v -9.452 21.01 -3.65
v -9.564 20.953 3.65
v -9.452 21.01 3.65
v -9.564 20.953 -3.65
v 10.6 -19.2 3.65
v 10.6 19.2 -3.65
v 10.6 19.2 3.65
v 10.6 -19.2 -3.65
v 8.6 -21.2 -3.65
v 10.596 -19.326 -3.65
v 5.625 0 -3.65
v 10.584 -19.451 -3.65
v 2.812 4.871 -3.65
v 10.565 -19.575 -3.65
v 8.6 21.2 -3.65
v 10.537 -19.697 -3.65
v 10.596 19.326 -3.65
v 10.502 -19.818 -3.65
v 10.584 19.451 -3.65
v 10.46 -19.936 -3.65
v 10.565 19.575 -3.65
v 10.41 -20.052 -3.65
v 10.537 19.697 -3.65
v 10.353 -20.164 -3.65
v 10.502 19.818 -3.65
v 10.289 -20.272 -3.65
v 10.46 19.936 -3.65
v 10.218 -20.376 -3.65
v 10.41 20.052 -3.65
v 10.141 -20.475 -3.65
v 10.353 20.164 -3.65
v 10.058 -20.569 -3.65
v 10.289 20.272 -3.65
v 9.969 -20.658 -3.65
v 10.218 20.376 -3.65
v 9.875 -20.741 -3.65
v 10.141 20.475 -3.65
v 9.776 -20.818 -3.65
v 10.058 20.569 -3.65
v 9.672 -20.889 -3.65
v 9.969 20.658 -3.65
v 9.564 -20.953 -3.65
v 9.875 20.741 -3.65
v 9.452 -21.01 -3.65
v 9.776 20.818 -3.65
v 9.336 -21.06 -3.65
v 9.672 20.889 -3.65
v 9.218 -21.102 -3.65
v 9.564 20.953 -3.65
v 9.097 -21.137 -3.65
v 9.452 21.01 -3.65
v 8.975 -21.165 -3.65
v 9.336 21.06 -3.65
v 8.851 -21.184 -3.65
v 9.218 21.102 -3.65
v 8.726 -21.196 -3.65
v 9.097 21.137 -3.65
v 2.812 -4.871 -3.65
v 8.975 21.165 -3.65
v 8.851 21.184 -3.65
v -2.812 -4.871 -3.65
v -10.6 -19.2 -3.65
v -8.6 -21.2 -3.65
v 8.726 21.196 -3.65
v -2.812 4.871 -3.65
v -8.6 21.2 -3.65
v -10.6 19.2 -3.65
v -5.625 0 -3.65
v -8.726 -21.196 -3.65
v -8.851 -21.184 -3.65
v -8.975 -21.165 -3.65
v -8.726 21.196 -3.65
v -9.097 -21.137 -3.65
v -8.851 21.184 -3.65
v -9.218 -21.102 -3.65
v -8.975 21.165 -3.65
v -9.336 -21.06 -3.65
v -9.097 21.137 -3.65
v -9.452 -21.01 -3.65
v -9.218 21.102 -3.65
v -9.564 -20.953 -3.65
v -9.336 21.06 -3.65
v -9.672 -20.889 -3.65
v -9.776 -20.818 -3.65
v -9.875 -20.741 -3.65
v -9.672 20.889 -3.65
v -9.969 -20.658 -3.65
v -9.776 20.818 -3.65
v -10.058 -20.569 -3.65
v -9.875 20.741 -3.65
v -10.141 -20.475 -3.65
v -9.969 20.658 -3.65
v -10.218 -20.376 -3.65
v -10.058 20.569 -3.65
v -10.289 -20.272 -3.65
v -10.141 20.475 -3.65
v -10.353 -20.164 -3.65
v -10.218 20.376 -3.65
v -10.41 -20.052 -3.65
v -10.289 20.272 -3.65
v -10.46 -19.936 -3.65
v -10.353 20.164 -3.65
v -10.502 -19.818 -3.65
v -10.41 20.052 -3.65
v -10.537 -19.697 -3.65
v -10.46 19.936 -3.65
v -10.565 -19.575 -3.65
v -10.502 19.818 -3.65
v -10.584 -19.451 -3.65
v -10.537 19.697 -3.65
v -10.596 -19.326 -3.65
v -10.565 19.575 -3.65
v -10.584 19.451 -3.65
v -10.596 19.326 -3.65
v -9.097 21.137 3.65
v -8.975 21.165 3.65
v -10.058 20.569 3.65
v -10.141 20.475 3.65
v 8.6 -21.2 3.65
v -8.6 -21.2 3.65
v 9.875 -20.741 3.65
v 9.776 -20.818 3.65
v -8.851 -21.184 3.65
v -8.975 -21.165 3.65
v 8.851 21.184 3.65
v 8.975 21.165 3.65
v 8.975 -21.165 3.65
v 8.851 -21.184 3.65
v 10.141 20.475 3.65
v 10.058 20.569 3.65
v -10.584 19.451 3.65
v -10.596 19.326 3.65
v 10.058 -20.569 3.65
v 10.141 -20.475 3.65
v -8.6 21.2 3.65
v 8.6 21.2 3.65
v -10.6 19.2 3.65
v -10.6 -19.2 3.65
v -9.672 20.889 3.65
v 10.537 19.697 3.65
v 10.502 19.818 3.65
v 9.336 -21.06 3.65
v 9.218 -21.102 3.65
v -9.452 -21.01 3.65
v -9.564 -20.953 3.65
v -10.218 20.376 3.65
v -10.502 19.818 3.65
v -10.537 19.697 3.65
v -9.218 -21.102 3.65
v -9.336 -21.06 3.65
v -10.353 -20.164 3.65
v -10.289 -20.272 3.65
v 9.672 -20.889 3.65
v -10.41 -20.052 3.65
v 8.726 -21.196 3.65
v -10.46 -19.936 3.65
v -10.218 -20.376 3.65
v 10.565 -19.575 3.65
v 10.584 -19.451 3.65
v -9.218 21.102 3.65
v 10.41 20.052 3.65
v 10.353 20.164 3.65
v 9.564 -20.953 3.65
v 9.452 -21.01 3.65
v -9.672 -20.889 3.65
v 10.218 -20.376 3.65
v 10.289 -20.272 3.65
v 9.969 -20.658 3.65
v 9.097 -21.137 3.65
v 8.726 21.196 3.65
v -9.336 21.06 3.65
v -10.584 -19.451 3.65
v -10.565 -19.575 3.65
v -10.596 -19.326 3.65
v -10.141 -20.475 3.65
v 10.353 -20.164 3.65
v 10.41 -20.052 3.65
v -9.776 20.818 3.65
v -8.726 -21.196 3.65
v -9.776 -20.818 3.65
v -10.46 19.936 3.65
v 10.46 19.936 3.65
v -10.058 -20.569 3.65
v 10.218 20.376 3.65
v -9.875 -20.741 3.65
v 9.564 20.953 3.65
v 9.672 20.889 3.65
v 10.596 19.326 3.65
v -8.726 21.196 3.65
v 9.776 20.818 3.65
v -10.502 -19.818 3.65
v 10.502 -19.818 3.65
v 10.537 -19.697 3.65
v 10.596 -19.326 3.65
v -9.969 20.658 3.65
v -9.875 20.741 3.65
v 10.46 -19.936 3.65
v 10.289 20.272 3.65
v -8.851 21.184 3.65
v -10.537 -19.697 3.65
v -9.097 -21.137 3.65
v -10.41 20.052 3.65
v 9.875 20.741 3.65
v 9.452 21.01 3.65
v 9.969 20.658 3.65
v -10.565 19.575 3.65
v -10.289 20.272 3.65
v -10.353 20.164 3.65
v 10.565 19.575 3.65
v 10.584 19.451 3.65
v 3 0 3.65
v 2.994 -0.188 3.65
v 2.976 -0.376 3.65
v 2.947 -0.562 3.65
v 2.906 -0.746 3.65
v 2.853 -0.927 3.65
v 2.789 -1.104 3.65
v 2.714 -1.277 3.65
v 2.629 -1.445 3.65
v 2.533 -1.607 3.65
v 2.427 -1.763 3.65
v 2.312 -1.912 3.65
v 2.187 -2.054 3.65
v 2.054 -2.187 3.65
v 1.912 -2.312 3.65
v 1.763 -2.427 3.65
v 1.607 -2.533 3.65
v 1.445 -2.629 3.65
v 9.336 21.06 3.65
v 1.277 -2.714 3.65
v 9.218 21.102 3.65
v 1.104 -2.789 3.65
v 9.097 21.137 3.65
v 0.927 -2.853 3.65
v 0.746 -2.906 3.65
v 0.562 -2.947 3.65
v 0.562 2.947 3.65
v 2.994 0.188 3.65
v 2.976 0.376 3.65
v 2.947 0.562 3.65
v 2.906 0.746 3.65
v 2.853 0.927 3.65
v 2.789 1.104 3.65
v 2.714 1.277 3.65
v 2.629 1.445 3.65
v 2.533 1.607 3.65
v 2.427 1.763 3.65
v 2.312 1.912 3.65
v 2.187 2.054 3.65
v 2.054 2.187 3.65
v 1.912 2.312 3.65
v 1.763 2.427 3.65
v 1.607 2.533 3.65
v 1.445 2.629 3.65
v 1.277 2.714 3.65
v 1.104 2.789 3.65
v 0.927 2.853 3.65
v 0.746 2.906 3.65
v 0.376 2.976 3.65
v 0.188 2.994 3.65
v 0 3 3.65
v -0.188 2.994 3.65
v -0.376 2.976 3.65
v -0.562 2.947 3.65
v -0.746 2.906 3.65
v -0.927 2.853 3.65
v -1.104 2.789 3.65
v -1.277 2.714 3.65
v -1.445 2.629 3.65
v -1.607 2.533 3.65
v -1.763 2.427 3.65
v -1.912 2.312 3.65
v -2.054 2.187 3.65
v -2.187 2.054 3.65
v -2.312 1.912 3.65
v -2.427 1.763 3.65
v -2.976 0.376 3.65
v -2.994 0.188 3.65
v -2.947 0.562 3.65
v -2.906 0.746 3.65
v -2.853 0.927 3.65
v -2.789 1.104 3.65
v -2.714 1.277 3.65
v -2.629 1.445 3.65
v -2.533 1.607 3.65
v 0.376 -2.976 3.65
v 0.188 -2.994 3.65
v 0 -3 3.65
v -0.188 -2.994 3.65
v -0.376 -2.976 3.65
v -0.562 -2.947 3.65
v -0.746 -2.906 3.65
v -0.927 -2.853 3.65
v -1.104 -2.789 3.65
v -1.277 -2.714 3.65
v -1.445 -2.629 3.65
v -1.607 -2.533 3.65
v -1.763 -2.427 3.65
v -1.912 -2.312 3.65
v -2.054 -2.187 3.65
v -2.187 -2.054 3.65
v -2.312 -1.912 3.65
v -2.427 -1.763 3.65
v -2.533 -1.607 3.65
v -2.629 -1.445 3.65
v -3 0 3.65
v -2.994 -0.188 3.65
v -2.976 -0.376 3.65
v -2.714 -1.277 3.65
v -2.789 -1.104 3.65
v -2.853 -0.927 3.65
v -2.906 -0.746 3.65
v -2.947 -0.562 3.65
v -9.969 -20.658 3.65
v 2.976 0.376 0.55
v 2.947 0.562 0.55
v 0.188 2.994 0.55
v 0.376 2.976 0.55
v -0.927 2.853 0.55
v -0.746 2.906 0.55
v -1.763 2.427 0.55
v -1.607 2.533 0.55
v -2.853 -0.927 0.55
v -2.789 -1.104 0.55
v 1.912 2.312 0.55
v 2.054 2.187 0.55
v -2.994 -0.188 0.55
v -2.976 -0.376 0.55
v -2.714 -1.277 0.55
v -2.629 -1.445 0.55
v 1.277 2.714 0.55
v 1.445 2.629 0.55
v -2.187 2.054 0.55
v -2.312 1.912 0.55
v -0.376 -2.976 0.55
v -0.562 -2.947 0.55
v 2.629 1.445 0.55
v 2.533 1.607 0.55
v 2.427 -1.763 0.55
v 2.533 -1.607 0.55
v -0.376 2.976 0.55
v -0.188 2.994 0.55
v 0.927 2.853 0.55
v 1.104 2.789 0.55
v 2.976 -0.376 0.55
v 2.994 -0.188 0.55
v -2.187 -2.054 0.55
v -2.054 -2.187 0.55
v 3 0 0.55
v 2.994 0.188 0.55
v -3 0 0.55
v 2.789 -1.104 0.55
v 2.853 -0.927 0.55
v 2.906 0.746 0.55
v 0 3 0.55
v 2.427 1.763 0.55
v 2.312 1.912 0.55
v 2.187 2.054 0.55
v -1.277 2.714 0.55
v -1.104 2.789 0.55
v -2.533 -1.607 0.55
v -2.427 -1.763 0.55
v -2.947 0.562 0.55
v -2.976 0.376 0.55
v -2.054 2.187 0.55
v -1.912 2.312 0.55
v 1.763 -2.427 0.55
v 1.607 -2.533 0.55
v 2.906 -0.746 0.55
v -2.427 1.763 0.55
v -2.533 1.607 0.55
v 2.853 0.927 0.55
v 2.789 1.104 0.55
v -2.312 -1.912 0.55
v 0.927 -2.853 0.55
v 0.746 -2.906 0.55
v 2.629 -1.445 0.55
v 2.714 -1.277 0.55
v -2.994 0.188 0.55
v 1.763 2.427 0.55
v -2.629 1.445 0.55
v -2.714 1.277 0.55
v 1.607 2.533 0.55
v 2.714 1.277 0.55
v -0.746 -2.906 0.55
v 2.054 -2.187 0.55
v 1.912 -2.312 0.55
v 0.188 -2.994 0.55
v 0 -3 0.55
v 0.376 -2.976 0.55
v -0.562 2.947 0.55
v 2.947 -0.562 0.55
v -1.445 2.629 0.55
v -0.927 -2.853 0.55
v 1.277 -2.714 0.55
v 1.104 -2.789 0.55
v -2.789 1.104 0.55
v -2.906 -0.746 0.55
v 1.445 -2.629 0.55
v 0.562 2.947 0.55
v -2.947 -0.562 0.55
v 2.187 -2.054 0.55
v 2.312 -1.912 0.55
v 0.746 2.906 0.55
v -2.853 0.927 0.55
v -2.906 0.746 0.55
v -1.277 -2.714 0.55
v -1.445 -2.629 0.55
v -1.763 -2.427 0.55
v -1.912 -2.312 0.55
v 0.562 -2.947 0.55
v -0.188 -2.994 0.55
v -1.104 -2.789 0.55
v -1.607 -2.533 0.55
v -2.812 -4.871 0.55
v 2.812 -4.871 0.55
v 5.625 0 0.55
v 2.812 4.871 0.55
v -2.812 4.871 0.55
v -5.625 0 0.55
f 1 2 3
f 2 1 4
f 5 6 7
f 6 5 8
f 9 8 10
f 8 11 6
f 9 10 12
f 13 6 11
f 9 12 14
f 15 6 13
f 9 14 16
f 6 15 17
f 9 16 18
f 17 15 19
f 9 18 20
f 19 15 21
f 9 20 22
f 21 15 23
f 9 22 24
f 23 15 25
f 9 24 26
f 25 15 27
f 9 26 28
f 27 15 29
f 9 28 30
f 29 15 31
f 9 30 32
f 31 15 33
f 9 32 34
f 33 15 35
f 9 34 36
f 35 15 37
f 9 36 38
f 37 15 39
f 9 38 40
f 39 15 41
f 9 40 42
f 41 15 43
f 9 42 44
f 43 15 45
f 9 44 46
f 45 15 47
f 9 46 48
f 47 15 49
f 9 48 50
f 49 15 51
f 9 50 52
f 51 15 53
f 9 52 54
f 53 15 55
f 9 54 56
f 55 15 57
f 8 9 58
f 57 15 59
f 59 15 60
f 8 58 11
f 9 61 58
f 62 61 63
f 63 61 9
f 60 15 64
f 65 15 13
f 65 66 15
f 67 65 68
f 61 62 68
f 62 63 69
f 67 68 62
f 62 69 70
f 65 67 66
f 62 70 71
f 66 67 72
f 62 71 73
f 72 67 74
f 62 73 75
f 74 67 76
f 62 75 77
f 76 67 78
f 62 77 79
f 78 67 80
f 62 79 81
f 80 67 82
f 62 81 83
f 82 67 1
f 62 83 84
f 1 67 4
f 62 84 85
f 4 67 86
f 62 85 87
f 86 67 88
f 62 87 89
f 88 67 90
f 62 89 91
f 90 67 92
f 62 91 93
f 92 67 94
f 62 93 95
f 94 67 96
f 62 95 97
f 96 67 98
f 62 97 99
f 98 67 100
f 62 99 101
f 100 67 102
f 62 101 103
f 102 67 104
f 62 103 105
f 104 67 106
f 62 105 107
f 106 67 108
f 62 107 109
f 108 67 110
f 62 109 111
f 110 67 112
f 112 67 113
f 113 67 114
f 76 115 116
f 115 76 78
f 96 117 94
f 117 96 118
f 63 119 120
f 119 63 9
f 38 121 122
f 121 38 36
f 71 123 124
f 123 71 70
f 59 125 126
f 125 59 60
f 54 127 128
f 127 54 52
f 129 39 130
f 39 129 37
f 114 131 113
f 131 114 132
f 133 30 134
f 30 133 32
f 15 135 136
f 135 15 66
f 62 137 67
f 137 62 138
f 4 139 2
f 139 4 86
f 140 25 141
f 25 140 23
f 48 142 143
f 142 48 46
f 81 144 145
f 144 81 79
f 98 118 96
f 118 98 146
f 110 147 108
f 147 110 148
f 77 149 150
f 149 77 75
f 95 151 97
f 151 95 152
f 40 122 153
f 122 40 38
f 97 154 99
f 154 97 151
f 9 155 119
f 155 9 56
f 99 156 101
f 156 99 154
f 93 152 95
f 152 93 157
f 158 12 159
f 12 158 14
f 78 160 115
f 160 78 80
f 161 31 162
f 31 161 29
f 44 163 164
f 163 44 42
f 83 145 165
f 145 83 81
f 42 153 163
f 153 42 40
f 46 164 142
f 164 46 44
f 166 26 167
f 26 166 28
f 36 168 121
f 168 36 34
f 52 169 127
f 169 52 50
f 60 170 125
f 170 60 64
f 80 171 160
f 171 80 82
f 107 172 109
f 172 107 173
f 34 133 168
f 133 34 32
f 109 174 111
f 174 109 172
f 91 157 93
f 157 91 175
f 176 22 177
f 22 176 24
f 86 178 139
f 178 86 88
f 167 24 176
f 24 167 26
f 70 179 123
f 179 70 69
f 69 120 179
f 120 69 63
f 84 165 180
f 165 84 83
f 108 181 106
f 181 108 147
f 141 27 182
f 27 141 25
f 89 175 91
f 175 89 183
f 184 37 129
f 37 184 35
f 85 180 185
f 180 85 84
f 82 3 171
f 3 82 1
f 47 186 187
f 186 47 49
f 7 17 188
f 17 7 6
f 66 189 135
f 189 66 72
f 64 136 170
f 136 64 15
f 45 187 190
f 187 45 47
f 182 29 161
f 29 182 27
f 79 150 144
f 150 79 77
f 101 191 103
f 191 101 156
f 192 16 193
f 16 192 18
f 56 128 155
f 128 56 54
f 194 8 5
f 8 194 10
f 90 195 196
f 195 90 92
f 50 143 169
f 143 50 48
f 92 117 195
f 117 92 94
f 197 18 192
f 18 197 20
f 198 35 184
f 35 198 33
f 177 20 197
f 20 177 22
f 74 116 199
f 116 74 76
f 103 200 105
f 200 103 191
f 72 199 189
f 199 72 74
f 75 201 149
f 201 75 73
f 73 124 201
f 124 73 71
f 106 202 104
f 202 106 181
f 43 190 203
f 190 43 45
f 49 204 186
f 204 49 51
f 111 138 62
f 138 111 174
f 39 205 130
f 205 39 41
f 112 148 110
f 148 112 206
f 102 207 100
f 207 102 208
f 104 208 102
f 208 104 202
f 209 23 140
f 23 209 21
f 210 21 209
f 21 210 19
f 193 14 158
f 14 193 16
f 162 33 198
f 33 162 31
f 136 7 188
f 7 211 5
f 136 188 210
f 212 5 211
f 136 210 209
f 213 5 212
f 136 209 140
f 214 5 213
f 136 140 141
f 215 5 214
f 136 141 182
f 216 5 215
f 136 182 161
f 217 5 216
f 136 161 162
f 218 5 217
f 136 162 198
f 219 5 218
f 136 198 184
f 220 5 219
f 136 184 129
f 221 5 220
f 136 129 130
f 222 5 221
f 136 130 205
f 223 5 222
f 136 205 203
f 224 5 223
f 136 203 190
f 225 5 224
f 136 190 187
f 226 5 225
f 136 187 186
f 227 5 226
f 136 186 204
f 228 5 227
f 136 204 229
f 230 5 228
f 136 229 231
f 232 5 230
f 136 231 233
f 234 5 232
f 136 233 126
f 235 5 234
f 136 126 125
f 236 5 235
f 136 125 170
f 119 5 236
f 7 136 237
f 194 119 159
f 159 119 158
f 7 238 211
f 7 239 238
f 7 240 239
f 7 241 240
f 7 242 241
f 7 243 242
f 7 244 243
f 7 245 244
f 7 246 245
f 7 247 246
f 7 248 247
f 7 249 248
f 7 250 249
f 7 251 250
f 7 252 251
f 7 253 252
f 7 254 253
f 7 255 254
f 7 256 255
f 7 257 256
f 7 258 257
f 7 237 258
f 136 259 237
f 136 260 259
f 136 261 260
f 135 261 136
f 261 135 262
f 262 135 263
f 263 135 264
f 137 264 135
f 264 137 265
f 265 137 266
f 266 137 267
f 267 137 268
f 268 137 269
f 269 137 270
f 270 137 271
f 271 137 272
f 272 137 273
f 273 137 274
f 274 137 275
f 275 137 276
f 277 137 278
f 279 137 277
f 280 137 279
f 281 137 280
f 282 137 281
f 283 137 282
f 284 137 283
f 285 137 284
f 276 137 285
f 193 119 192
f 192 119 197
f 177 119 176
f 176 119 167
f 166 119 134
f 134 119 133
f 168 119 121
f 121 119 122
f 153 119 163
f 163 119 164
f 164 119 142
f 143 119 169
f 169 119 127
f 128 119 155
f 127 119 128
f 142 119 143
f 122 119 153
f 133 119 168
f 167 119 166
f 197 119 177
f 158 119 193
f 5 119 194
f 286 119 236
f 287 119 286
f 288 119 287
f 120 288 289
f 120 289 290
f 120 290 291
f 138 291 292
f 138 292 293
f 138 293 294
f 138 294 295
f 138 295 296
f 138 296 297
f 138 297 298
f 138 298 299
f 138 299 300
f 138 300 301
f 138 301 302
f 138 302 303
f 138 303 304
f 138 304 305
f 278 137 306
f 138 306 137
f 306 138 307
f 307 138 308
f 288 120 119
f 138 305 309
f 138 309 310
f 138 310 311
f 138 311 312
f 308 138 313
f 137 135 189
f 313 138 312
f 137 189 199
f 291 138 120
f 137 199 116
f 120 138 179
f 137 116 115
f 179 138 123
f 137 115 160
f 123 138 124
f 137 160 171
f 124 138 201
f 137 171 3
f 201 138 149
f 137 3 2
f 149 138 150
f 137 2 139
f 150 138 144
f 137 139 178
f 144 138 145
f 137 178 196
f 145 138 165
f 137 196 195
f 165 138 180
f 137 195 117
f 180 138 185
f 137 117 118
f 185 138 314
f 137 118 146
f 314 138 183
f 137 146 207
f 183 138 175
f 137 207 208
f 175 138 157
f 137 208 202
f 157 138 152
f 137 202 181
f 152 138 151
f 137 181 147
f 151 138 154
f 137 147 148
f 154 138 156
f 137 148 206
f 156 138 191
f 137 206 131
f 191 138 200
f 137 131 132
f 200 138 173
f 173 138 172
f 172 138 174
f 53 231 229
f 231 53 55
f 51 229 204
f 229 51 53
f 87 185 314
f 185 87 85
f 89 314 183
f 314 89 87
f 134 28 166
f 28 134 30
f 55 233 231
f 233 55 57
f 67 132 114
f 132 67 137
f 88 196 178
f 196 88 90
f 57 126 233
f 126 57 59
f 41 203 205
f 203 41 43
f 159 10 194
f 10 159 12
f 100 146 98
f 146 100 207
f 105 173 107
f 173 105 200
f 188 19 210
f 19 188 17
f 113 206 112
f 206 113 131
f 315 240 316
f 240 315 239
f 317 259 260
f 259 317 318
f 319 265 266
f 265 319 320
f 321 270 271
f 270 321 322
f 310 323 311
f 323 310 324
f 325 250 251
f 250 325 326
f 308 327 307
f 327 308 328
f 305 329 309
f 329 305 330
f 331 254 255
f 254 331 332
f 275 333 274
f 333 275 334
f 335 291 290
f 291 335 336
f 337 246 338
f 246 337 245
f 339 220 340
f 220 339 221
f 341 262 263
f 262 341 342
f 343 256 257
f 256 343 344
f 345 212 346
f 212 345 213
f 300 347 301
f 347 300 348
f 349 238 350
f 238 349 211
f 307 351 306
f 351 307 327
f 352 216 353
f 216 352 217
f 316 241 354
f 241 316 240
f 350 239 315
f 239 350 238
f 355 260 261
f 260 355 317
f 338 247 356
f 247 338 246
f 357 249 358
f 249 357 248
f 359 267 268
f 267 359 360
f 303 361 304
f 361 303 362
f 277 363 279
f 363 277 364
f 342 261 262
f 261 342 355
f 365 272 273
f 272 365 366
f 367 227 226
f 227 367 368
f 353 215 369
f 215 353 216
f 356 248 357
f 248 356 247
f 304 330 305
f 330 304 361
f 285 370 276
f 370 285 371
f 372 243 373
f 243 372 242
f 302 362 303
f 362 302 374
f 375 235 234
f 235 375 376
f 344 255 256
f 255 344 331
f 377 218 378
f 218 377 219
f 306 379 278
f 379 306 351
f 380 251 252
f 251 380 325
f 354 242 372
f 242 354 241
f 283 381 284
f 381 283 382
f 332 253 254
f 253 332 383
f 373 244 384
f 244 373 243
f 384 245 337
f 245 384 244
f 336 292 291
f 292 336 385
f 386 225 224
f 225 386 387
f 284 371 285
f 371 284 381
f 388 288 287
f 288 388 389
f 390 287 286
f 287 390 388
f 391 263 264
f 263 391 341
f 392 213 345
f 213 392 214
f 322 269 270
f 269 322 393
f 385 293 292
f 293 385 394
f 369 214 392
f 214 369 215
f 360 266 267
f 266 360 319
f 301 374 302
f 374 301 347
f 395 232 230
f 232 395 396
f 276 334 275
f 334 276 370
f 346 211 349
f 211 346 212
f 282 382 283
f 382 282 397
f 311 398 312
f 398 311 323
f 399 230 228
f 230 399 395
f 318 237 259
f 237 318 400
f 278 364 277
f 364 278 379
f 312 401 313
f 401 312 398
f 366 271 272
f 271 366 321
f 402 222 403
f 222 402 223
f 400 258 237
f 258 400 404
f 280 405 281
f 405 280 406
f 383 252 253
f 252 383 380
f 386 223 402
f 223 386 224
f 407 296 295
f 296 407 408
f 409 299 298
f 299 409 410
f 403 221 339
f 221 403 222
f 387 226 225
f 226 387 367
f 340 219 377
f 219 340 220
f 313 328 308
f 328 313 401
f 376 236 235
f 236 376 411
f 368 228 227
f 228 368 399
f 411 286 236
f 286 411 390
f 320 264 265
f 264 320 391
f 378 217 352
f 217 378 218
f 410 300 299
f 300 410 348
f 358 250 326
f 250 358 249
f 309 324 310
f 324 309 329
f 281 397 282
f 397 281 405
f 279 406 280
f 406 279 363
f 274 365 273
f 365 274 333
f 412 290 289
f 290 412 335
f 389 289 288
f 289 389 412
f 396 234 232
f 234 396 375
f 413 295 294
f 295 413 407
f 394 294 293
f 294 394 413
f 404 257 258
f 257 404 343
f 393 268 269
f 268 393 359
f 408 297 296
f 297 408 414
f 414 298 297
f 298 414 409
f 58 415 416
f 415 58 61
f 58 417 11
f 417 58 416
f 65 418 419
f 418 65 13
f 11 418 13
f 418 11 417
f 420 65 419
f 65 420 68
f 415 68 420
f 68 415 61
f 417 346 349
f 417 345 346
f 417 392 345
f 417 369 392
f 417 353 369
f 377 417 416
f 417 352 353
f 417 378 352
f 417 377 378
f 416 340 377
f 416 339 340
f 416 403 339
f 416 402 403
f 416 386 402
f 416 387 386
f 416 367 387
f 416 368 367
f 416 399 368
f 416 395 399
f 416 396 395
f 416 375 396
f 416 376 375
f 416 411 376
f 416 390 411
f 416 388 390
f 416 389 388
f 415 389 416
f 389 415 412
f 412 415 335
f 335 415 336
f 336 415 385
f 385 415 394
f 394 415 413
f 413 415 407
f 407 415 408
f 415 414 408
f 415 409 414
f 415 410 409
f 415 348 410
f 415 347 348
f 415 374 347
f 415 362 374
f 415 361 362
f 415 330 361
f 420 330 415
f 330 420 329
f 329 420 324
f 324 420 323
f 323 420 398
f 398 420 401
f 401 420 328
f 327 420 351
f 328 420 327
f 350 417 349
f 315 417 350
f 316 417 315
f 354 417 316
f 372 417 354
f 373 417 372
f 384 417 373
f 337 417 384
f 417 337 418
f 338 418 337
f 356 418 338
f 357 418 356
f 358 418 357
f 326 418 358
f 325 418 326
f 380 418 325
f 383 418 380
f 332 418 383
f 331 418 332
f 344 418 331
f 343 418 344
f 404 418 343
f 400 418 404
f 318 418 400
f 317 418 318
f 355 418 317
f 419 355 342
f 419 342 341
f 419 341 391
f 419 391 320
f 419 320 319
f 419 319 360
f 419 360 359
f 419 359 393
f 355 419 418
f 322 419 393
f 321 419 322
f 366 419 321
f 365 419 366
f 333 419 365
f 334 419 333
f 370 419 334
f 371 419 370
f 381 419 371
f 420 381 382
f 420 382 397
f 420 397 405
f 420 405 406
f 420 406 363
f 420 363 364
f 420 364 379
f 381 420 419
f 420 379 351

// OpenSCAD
$fn=100;

GAP = 0.2;

W = 22.2-1;
T = 8.3-1;
L = W*2;
SCREW_D = 6;
HEX_W = 11.25;
HEX_T = 4.2;

R_CORNER = 2;

module draft(w=W, t=T, l=L, screw_d=SCREW_D, hex_w=HEX_W, hex_t=HEX_T) {
    difference() {
        cube([w, l, t], center=true);
        cylinder(d=screw_d, h=t+2, center=true);
        translate([0, 0, -T/2-GAP])
        cylinder(d=hex_w, h=hex_t+GAP, $fn=6);
    }

}

module channel_bolt(w=W, t=T, l=L, screw_d=SCREW_D, hex_w=HEX_W, hex_t=HEX_T, r_corner=R_CORNER) {
    difference() {
        hull() {
            for(i=[-1,1]) {
                for(j=[-1,1]) {
                    translate([i * (w/2 - r_corner), j * (l/2 - r_corner), 0])
                        cylinder(r=r_corner, h=T, center=true);
                }
            }
        }
        cylinder(d=screw_d, h=t+2, center=true);
        translate([0, 0, -T/2-GAP])
            cylinder(d=hex_w, h=hex_t+GAP, $fn=6);
    }

}


//translate([0, 0, -T/2-GAP])
//        % cylinder(d=HEX_W, h=HEX_T+GAP, $fn=6);

channel_bolt();
